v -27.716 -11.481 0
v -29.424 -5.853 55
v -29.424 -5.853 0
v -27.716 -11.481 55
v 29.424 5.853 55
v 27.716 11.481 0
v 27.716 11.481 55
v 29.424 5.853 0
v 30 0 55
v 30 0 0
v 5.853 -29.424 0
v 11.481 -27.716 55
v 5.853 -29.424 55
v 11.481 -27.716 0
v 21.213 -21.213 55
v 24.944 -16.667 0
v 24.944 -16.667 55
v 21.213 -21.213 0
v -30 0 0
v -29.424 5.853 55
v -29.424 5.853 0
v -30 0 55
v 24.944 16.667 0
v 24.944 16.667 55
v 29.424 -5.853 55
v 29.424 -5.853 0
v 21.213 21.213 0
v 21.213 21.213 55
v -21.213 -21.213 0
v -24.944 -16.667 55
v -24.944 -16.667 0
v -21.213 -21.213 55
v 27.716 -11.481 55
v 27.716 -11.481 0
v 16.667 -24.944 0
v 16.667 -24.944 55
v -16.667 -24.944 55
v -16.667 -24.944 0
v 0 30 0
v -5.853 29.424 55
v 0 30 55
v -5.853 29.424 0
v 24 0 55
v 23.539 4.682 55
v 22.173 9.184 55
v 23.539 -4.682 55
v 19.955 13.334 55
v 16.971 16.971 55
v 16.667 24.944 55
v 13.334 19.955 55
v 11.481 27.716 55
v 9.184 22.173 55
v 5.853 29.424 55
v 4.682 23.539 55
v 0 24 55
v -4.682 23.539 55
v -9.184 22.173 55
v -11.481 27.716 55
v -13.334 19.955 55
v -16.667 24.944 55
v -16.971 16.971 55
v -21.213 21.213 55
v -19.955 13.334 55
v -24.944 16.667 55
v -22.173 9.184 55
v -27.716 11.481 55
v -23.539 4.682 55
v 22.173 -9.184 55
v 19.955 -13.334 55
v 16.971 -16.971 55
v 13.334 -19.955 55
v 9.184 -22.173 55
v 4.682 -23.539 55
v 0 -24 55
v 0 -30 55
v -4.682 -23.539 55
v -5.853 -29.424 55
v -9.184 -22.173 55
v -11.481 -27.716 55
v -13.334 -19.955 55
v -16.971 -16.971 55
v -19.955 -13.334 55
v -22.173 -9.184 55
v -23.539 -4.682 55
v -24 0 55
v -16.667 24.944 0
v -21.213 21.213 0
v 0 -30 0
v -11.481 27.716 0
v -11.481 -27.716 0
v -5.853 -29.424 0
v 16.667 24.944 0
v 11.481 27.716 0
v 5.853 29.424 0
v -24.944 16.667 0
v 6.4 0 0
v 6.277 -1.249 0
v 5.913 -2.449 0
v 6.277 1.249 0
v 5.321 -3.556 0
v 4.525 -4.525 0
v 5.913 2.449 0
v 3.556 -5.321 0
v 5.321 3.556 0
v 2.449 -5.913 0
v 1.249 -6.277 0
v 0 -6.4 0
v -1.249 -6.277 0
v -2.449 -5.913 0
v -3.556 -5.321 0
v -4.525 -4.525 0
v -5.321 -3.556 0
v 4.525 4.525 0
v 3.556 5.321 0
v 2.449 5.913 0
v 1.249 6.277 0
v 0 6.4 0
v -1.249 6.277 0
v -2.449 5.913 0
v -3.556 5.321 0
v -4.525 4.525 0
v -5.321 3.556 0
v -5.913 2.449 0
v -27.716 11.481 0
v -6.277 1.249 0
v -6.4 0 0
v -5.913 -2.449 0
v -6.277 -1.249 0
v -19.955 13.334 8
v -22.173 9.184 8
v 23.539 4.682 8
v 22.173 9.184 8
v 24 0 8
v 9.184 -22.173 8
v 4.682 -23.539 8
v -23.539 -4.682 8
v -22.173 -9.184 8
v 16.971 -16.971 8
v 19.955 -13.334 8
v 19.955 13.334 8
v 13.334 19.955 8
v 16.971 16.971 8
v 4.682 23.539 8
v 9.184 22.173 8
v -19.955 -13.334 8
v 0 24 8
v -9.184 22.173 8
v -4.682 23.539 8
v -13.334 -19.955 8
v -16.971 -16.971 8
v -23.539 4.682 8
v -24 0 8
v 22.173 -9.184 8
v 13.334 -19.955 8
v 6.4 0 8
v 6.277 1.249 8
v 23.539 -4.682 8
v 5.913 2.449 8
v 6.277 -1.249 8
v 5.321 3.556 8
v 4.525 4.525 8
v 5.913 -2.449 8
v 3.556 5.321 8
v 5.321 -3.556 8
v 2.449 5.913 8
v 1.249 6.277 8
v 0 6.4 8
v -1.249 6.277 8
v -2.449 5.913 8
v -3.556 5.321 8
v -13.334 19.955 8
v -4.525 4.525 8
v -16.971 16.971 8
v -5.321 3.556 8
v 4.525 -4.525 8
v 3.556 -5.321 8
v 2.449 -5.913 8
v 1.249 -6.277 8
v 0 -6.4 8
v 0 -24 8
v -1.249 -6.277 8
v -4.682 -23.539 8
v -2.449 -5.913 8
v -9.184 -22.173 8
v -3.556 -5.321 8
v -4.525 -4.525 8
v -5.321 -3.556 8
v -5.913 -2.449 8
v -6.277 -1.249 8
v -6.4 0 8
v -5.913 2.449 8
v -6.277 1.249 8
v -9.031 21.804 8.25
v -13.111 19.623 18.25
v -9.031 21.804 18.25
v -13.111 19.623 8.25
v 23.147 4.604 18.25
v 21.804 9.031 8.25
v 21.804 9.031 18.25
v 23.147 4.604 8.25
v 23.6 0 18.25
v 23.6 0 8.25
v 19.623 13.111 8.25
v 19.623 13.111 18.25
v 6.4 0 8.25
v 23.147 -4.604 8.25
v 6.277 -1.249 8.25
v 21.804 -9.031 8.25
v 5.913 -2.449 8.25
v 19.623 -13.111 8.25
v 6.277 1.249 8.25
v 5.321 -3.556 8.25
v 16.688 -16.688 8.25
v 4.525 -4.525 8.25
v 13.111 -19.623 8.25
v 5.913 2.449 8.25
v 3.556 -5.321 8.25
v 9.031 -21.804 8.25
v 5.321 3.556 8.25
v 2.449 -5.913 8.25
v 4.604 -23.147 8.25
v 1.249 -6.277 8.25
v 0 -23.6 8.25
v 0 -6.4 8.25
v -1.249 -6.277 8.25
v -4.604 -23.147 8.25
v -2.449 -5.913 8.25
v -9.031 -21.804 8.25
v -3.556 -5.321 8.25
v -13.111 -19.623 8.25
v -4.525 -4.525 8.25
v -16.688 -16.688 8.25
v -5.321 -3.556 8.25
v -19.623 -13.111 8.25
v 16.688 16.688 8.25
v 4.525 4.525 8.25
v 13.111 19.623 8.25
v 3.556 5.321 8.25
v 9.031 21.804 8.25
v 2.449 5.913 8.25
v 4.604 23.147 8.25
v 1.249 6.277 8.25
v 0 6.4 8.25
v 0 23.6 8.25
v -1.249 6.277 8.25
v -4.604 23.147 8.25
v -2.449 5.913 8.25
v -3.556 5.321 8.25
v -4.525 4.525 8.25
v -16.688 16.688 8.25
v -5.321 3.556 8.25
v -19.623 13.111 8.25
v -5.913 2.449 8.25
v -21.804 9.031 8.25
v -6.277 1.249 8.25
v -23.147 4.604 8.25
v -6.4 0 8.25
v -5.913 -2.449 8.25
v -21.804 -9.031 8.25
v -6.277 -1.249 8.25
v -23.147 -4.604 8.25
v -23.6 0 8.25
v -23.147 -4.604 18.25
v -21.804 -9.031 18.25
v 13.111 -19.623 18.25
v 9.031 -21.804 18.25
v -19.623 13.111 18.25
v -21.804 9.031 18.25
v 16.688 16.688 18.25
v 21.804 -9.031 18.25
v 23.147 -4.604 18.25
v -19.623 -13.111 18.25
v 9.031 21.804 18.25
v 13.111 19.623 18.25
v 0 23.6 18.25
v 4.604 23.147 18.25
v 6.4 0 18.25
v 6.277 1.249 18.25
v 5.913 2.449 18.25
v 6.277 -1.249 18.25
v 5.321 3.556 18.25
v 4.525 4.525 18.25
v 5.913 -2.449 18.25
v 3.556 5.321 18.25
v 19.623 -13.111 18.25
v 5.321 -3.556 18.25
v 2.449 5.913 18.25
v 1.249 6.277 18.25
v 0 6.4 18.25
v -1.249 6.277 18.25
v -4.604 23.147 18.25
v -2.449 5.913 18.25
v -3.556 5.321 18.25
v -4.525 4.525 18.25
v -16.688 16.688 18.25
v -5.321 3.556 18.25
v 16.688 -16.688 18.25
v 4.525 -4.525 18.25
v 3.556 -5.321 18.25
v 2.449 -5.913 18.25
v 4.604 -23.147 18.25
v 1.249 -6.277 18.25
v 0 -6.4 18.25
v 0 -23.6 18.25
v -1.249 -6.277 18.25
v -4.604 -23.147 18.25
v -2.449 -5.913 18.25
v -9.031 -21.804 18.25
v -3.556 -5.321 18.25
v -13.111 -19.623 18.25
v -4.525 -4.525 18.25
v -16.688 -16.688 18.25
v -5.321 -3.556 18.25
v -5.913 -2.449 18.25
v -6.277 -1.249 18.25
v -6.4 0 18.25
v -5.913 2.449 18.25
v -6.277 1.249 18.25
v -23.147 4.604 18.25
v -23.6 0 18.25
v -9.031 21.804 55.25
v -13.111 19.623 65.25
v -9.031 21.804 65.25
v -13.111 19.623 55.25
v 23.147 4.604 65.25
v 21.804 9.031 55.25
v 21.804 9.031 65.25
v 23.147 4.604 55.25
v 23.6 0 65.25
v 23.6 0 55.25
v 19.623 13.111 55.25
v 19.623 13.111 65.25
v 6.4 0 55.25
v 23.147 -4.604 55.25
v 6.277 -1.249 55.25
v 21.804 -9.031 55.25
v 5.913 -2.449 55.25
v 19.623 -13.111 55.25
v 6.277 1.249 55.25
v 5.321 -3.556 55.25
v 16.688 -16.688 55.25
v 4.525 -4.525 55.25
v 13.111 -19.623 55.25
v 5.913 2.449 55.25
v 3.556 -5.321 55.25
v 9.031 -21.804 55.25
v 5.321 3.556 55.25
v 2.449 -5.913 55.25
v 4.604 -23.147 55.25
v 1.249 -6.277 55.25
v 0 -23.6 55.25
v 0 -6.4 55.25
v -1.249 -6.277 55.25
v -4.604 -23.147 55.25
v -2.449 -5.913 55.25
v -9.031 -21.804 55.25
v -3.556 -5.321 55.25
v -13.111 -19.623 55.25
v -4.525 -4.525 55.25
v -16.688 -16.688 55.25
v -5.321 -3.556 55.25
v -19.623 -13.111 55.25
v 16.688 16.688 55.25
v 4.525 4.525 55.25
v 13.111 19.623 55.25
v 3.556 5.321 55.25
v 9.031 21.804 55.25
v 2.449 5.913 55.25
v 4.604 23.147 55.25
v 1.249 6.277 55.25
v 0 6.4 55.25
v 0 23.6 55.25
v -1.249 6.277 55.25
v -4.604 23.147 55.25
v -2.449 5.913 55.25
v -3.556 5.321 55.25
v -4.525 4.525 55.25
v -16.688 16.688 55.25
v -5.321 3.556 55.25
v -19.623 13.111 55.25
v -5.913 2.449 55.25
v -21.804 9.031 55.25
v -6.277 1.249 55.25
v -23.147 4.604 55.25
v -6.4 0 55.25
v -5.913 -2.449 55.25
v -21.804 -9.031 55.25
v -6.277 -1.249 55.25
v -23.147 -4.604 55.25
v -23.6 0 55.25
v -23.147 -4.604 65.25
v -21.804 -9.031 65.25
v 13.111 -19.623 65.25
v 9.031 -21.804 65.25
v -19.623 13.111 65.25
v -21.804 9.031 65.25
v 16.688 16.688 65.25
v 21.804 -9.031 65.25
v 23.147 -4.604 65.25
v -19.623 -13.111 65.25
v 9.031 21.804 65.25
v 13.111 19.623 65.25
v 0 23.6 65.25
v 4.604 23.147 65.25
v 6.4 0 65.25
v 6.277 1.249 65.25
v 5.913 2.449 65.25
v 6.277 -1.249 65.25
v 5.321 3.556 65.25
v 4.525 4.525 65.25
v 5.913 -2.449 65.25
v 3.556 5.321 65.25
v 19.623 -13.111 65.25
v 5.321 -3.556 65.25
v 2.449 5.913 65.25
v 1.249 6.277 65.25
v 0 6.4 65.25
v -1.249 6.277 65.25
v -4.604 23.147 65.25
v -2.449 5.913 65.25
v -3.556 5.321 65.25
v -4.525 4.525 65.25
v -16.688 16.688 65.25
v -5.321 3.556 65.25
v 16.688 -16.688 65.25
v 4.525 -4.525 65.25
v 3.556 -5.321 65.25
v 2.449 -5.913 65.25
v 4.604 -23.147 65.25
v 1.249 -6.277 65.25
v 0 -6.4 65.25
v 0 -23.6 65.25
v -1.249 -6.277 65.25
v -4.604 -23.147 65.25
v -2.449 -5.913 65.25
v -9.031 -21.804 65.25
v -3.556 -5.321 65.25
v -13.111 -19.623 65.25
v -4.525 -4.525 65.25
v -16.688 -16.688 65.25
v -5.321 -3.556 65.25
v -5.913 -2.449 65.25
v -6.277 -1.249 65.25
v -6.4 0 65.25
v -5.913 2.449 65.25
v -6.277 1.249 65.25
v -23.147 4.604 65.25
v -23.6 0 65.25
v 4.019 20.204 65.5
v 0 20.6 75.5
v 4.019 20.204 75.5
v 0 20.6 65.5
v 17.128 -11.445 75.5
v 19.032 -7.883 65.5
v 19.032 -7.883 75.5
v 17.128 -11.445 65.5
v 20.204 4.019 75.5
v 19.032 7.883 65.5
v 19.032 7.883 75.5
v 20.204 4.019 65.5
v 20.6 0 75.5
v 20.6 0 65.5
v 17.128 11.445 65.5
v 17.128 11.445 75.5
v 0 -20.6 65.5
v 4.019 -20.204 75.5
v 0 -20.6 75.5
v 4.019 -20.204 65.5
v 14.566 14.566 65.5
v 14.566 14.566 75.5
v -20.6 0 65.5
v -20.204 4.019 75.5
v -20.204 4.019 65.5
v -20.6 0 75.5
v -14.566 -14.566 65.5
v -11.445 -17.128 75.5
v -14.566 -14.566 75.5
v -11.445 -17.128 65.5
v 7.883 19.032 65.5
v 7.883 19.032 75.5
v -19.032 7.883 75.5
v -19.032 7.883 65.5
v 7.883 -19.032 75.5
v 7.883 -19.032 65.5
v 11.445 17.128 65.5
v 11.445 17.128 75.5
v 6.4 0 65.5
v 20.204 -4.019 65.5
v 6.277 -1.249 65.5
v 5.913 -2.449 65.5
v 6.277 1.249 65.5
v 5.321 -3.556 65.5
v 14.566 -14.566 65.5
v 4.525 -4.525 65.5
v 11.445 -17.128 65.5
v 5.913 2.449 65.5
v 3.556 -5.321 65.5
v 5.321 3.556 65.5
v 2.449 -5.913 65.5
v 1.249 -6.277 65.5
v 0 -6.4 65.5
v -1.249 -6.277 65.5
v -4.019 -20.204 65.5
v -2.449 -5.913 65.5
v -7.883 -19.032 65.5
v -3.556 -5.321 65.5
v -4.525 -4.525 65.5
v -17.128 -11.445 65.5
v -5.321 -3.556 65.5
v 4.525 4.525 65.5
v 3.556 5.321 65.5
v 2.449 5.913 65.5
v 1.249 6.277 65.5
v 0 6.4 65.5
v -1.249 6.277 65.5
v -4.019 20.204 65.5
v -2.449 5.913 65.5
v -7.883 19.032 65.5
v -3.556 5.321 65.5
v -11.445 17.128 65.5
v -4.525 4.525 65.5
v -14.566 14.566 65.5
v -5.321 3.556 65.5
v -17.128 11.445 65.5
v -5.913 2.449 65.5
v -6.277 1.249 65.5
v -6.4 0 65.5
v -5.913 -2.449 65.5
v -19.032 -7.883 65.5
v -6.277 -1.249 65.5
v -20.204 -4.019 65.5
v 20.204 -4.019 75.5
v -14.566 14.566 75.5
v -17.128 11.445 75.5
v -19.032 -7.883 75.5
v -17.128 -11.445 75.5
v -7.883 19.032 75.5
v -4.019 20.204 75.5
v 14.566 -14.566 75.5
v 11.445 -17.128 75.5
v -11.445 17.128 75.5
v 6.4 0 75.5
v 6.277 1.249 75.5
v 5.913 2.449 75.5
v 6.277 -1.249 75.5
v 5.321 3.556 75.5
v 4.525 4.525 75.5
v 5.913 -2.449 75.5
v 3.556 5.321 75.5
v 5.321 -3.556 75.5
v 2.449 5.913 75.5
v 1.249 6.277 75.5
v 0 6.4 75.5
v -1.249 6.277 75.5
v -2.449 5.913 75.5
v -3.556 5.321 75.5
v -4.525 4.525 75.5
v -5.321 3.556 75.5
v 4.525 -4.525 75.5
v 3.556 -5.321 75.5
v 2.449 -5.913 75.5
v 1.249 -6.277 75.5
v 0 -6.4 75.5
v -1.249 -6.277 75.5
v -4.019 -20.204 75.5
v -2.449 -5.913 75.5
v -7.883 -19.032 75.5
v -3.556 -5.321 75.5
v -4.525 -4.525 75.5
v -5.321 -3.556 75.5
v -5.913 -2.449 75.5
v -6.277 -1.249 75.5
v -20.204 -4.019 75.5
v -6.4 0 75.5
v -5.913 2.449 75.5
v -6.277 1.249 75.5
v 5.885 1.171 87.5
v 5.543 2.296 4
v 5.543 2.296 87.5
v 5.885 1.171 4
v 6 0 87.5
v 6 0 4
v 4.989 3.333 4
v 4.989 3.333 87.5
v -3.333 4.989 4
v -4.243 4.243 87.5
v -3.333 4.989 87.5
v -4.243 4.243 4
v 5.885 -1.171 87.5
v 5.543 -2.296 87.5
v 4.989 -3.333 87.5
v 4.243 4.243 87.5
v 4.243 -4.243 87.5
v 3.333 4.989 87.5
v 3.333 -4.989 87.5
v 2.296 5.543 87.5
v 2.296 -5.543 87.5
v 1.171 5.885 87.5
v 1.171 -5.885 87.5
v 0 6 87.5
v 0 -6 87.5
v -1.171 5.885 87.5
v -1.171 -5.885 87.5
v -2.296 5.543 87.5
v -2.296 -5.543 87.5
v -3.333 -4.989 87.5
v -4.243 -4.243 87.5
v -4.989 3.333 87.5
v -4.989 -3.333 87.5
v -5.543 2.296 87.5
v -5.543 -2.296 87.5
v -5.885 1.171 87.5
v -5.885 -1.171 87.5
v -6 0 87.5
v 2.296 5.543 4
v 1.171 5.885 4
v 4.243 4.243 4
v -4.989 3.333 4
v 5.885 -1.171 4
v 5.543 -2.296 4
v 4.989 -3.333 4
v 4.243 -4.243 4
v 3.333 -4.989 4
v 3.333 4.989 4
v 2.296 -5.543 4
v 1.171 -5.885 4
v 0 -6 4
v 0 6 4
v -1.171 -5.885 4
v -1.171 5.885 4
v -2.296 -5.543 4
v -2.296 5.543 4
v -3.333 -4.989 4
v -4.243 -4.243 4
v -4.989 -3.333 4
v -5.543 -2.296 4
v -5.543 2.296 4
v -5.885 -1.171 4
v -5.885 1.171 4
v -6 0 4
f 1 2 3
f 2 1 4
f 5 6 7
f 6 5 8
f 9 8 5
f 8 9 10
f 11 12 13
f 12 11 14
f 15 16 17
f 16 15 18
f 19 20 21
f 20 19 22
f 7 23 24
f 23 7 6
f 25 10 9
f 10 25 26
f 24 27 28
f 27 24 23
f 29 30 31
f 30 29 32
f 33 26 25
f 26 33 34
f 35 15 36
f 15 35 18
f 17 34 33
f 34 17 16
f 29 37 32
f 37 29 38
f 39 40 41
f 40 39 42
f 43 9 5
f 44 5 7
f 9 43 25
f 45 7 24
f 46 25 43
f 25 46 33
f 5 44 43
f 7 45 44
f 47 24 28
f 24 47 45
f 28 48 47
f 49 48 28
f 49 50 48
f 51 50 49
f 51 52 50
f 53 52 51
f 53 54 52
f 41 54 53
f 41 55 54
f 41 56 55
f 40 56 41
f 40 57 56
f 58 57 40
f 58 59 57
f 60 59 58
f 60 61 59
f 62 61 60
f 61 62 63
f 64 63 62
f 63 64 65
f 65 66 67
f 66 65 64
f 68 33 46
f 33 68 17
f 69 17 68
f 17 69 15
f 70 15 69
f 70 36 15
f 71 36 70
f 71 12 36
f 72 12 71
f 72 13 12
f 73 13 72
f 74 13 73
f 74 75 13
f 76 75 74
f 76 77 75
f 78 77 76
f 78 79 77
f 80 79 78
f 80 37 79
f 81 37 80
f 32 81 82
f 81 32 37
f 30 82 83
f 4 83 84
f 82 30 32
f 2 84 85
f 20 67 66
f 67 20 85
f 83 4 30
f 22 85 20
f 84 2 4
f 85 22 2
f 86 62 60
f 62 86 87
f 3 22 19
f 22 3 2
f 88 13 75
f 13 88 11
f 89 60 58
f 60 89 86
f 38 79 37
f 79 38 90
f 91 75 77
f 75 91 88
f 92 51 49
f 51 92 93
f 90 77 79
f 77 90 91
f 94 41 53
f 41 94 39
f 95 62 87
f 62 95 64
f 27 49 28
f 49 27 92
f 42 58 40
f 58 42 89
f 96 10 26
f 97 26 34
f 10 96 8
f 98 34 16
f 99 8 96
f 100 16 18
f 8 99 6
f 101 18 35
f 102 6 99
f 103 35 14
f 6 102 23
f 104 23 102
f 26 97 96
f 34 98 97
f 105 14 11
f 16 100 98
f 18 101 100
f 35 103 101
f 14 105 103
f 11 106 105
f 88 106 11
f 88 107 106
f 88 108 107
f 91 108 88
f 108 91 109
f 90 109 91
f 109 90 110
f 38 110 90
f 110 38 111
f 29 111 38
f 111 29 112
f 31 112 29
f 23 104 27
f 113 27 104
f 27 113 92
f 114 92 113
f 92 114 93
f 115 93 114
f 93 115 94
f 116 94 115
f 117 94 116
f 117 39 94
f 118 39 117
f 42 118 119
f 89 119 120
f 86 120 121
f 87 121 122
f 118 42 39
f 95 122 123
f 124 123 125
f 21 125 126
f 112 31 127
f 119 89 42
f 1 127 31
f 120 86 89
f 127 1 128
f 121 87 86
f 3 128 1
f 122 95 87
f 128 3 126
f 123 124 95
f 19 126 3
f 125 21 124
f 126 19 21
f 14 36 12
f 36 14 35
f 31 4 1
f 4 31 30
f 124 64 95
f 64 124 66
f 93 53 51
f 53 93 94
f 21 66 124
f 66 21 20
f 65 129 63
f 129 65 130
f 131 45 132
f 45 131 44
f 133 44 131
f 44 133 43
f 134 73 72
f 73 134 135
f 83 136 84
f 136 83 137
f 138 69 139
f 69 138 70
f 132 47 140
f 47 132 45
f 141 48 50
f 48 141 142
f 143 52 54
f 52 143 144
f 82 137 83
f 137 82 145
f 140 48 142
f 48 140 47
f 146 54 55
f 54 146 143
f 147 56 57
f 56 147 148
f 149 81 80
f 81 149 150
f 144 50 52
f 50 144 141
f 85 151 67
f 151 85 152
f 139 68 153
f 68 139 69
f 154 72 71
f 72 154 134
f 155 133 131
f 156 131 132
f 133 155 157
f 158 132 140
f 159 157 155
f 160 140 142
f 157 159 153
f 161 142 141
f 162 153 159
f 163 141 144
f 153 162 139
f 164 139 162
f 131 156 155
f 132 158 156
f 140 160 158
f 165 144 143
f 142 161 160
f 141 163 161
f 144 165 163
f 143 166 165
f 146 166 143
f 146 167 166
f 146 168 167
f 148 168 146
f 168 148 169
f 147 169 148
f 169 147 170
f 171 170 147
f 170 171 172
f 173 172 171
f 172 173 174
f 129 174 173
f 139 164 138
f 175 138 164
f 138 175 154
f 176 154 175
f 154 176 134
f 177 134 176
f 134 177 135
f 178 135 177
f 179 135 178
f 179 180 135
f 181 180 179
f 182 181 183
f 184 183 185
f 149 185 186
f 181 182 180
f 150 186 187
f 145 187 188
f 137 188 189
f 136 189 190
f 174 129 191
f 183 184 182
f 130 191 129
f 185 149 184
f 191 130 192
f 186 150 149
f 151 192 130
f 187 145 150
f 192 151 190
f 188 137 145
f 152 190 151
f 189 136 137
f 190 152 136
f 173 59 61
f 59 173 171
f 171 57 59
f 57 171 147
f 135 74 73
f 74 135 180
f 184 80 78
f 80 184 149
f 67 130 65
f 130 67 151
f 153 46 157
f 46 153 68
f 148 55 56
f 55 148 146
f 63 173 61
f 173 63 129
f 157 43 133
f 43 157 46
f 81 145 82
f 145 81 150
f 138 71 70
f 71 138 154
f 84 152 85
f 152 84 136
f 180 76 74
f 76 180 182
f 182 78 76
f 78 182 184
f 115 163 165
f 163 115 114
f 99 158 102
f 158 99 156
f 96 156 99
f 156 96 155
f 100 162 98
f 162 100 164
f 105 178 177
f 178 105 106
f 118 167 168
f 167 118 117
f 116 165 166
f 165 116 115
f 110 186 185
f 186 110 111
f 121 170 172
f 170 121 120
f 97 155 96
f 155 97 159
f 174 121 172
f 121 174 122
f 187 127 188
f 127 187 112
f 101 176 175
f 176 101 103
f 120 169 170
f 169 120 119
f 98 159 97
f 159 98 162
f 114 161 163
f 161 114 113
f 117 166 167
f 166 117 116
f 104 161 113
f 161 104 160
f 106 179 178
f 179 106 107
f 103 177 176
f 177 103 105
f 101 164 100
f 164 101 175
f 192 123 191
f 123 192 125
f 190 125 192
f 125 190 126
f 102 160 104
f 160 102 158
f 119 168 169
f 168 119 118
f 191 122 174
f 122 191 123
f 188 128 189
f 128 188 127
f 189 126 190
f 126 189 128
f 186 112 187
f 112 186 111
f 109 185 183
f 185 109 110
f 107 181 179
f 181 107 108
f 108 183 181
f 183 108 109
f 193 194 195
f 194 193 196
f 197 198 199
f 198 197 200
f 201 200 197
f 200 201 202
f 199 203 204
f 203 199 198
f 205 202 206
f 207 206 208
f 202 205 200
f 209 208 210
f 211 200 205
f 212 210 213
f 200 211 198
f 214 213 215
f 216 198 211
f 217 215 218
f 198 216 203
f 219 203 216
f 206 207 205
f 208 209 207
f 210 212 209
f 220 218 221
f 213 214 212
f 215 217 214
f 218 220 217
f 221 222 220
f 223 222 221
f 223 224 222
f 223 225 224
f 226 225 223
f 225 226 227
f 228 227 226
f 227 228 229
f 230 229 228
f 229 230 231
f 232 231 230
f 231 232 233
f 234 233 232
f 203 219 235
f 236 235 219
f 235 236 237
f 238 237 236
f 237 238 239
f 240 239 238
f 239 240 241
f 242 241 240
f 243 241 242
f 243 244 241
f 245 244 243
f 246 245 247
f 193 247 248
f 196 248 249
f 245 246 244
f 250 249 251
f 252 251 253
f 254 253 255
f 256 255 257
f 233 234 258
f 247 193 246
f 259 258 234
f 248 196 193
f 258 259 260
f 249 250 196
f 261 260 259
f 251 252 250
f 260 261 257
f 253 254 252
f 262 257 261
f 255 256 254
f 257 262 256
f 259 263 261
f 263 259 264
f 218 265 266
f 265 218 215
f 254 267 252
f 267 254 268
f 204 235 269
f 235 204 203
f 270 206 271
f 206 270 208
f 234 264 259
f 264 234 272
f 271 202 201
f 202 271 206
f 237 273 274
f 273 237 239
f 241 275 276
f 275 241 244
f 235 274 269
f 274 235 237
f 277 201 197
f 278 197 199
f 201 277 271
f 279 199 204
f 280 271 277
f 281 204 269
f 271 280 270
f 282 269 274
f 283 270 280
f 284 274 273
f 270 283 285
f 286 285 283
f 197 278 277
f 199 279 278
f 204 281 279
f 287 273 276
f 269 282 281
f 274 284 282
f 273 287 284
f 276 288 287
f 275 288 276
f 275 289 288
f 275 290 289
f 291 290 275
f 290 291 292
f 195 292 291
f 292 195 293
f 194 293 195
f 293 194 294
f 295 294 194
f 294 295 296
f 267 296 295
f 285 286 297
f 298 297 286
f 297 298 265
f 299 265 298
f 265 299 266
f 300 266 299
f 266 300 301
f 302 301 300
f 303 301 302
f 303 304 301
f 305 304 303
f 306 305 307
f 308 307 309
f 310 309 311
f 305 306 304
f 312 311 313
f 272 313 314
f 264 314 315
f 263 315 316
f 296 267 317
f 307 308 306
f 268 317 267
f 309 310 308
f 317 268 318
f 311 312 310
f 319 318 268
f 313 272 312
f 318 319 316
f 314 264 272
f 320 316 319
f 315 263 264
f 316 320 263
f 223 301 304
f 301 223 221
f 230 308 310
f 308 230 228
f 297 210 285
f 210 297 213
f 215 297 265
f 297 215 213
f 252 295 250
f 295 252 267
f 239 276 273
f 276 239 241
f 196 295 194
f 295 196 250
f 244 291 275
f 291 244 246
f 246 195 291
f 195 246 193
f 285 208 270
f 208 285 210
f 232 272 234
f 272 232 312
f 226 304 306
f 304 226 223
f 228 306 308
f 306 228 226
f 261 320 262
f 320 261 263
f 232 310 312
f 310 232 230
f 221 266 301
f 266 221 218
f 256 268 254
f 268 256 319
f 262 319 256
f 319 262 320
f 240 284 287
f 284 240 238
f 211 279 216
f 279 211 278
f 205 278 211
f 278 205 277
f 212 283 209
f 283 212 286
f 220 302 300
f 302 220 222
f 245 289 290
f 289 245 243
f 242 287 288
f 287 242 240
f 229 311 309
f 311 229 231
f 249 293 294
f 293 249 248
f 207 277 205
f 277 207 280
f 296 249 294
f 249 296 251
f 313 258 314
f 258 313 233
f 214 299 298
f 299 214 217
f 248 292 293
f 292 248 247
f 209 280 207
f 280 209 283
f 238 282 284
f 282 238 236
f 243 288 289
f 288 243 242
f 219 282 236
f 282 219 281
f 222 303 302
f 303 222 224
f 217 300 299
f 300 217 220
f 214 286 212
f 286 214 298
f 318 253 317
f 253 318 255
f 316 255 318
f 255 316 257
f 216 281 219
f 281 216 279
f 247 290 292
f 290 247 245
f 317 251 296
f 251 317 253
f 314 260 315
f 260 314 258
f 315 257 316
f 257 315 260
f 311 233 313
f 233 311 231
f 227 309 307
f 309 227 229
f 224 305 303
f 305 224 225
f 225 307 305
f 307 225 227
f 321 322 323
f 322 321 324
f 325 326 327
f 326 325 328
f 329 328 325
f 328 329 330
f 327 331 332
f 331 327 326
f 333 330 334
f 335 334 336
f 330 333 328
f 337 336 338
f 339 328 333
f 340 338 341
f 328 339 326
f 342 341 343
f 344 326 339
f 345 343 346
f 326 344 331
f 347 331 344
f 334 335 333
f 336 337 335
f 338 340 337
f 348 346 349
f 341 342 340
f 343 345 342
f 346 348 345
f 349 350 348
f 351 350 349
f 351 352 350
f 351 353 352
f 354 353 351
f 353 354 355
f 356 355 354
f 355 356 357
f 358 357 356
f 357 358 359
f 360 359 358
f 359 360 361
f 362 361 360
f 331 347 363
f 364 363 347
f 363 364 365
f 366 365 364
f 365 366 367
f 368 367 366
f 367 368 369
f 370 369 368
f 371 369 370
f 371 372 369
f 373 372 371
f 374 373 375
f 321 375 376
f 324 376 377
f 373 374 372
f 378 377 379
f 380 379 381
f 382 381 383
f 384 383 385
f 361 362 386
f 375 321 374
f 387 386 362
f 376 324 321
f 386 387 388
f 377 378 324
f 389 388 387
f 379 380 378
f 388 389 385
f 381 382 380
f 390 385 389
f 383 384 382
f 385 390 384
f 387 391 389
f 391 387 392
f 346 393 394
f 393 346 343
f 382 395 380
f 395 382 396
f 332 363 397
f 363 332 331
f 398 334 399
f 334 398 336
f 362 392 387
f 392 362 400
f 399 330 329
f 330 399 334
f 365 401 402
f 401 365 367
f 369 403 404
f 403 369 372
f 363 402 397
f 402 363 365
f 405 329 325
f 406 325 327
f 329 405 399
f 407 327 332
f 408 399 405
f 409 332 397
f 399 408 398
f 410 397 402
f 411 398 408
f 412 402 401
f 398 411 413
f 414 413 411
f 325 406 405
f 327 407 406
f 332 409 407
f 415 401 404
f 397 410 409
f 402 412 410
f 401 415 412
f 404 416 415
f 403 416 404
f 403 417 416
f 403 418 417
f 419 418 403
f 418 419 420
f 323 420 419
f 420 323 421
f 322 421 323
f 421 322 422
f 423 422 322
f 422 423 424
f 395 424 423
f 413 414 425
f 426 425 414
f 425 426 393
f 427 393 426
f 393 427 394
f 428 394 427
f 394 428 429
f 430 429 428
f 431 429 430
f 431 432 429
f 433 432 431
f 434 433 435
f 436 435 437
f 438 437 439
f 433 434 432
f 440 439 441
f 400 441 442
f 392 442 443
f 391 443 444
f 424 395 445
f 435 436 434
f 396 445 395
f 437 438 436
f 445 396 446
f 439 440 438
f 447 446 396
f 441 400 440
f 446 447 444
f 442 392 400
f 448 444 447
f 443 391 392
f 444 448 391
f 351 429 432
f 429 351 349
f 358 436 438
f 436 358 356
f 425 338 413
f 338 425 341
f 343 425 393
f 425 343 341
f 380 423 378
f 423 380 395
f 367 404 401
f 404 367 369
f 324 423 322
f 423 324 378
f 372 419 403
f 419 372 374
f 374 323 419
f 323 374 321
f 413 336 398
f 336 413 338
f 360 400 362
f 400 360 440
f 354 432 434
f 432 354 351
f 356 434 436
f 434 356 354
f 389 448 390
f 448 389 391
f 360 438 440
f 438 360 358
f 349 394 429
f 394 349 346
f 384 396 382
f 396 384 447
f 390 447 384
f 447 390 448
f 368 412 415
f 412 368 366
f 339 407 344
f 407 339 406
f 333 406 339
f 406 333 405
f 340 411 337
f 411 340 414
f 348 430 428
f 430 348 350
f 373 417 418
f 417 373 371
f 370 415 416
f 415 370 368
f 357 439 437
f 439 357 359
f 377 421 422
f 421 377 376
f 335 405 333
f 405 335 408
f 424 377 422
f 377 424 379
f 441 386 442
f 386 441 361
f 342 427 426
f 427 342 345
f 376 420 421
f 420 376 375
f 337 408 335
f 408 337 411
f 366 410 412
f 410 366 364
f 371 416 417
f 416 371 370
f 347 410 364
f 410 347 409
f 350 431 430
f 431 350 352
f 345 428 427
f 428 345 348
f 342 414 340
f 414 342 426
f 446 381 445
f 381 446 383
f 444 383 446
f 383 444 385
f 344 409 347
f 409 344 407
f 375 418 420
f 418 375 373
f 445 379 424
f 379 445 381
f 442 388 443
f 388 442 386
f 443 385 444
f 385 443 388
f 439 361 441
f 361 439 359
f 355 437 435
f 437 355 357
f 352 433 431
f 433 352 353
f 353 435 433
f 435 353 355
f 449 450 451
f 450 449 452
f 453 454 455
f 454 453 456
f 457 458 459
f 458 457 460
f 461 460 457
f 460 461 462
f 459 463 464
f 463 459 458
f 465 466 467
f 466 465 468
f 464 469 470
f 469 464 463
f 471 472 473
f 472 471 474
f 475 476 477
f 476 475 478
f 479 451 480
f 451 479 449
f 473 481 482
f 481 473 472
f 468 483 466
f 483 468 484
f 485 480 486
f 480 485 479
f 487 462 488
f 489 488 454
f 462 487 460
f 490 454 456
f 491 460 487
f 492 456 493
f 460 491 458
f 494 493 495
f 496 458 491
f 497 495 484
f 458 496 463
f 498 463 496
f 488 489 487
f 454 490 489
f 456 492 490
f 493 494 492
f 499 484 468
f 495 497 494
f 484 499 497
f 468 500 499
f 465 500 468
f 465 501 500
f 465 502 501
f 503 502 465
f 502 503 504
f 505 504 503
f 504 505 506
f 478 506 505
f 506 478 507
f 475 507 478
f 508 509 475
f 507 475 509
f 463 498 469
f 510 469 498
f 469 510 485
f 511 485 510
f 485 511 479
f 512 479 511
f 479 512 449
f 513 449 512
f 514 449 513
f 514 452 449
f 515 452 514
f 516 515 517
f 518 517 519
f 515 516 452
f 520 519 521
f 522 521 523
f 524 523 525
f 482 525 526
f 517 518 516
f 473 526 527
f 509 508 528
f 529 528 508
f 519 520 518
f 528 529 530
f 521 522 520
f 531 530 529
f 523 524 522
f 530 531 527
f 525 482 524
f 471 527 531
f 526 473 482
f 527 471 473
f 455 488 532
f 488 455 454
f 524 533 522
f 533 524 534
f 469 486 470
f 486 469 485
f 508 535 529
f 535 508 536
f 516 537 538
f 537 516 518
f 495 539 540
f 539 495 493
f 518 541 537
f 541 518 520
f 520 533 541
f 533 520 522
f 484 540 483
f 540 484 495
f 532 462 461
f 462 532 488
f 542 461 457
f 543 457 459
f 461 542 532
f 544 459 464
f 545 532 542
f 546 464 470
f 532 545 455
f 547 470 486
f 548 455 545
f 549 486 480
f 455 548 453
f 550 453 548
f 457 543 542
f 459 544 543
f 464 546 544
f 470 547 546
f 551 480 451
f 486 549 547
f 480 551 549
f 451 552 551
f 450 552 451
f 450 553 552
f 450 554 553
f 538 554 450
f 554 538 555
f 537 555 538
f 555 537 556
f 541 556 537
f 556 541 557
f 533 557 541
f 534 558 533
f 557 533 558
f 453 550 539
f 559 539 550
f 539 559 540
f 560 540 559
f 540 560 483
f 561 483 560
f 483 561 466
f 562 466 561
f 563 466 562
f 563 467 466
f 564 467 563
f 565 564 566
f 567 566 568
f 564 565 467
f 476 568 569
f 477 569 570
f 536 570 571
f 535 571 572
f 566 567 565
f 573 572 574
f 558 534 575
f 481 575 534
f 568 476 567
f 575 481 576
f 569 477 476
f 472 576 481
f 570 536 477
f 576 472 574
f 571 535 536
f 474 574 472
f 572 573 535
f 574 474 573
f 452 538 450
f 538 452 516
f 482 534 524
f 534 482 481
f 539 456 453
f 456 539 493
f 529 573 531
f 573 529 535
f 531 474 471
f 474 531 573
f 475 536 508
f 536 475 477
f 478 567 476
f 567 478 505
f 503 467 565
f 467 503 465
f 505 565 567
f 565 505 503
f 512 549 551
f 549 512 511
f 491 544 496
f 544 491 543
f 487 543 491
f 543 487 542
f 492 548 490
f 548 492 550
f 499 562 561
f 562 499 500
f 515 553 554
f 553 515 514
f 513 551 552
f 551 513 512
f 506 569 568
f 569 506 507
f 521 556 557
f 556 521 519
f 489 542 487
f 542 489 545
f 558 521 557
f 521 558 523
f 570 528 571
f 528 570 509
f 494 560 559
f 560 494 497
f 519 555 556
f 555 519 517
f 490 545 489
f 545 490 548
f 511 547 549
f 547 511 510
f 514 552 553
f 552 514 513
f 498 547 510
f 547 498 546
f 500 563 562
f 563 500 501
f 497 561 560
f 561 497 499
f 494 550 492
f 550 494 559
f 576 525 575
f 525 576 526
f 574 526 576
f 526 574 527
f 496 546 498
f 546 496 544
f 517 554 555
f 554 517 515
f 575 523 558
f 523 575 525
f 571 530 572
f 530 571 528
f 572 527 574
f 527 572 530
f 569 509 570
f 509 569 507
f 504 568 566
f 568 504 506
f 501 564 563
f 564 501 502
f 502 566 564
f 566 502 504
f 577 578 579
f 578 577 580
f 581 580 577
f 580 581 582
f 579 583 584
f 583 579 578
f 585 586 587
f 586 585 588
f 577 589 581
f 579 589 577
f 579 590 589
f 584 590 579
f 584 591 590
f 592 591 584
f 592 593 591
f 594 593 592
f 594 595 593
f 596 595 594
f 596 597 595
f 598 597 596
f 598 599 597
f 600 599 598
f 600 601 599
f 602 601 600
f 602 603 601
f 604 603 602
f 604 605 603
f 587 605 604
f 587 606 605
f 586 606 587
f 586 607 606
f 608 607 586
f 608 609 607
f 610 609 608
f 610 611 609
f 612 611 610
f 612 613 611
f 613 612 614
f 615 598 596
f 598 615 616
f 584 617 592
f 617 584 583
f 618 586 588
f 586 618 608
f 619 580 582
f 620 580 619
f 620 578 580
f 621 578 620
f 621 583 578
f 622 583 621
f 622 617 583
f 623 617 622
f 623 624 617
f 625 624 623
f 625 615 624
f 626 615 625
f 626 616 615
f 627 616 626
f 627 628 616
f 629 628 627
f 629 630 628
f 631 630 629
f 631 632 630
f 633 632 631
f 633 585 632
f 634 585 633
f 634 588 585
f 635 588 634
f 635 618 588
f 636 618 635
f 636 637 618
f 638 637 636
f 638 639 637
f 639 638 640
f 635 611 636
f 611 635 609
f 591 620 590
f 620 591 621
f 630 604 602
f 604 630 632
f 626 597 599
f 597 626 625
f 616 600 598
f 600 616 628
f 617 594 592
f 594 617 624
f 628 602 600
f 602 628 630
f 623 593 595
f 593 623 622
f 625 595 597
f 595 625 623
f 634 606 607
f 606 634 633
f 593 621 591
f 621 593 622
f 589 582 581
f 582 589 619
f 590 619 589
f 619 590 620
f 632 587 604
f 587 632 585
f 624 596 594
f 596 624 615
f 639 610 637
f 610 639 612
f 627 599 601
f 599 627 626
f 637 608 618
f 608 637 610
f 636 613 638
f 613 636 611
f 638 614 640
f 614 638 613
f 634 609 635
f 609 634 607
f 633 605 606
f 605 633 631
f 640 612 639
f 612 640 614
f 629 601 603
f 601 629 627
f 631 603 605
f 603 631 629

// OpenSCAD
$fn = 32;

// ------------------------------------------------------------------------
// Bearing housing: housing d60, two bearings and a shaft
// Every part is its own module, assembly() places them once.
// ------------------------------------------------------------------------

// --- part 1 ---
module housing() {
  difference() {
    cylinder(h = 55, d = 60);
    translate([0, 0, 8]) cylinder(h = 48, d = 48);
    translate([0, 0, -1]) cylinder(h = 10, d = 12.8);
  }
}

// --- part 2 ---
module bearing_lower() {
  difference() {
      translate([0, 0, 0]) cylinder(h = 10, d = 47.2);
      translate([0, 0, -1]) cylinder(h = 12, d = 12.8);
    }
}

// --- part 3 ---
module bearing_upper() {
  difference() {
      translate([0, 0, 0]) cylinder(h = 10, d = 47.2);
      translate([0, 0, -1]) cylinder(h = 12, d = 12.8);
    }
}

// --- part 4 ---
module spacer() {
  difference() {
      translate([0, 0, 0]) cylinder(h = 10, d = 41.2);
      translate([0, 0, -1]) cylinder(h = 12, d = 12.8);
    }
}

// --- part 5 ---
module shaft() {
  translate([0, 0, -41.75]) cylinder(h = 83.5, d = 12);
}

// --- assembly ---
module assembly() {
  translate([0, 0, 0]) rotate([0, 0, 0]) housing();
  translate([0, 0, 8.25]) rotate([0, 0, 0]) bearing_lower();
  translate([0, 0, 55.25]) rotate([0, 0, 0]) bearing_upper();
  translate([0, 0, 65.5]) rotate([0, 0, 0]) spacer();
  translate([0, 0, 45.75]) rotate([0, 0, 0]) shaft();
}

assembly();
